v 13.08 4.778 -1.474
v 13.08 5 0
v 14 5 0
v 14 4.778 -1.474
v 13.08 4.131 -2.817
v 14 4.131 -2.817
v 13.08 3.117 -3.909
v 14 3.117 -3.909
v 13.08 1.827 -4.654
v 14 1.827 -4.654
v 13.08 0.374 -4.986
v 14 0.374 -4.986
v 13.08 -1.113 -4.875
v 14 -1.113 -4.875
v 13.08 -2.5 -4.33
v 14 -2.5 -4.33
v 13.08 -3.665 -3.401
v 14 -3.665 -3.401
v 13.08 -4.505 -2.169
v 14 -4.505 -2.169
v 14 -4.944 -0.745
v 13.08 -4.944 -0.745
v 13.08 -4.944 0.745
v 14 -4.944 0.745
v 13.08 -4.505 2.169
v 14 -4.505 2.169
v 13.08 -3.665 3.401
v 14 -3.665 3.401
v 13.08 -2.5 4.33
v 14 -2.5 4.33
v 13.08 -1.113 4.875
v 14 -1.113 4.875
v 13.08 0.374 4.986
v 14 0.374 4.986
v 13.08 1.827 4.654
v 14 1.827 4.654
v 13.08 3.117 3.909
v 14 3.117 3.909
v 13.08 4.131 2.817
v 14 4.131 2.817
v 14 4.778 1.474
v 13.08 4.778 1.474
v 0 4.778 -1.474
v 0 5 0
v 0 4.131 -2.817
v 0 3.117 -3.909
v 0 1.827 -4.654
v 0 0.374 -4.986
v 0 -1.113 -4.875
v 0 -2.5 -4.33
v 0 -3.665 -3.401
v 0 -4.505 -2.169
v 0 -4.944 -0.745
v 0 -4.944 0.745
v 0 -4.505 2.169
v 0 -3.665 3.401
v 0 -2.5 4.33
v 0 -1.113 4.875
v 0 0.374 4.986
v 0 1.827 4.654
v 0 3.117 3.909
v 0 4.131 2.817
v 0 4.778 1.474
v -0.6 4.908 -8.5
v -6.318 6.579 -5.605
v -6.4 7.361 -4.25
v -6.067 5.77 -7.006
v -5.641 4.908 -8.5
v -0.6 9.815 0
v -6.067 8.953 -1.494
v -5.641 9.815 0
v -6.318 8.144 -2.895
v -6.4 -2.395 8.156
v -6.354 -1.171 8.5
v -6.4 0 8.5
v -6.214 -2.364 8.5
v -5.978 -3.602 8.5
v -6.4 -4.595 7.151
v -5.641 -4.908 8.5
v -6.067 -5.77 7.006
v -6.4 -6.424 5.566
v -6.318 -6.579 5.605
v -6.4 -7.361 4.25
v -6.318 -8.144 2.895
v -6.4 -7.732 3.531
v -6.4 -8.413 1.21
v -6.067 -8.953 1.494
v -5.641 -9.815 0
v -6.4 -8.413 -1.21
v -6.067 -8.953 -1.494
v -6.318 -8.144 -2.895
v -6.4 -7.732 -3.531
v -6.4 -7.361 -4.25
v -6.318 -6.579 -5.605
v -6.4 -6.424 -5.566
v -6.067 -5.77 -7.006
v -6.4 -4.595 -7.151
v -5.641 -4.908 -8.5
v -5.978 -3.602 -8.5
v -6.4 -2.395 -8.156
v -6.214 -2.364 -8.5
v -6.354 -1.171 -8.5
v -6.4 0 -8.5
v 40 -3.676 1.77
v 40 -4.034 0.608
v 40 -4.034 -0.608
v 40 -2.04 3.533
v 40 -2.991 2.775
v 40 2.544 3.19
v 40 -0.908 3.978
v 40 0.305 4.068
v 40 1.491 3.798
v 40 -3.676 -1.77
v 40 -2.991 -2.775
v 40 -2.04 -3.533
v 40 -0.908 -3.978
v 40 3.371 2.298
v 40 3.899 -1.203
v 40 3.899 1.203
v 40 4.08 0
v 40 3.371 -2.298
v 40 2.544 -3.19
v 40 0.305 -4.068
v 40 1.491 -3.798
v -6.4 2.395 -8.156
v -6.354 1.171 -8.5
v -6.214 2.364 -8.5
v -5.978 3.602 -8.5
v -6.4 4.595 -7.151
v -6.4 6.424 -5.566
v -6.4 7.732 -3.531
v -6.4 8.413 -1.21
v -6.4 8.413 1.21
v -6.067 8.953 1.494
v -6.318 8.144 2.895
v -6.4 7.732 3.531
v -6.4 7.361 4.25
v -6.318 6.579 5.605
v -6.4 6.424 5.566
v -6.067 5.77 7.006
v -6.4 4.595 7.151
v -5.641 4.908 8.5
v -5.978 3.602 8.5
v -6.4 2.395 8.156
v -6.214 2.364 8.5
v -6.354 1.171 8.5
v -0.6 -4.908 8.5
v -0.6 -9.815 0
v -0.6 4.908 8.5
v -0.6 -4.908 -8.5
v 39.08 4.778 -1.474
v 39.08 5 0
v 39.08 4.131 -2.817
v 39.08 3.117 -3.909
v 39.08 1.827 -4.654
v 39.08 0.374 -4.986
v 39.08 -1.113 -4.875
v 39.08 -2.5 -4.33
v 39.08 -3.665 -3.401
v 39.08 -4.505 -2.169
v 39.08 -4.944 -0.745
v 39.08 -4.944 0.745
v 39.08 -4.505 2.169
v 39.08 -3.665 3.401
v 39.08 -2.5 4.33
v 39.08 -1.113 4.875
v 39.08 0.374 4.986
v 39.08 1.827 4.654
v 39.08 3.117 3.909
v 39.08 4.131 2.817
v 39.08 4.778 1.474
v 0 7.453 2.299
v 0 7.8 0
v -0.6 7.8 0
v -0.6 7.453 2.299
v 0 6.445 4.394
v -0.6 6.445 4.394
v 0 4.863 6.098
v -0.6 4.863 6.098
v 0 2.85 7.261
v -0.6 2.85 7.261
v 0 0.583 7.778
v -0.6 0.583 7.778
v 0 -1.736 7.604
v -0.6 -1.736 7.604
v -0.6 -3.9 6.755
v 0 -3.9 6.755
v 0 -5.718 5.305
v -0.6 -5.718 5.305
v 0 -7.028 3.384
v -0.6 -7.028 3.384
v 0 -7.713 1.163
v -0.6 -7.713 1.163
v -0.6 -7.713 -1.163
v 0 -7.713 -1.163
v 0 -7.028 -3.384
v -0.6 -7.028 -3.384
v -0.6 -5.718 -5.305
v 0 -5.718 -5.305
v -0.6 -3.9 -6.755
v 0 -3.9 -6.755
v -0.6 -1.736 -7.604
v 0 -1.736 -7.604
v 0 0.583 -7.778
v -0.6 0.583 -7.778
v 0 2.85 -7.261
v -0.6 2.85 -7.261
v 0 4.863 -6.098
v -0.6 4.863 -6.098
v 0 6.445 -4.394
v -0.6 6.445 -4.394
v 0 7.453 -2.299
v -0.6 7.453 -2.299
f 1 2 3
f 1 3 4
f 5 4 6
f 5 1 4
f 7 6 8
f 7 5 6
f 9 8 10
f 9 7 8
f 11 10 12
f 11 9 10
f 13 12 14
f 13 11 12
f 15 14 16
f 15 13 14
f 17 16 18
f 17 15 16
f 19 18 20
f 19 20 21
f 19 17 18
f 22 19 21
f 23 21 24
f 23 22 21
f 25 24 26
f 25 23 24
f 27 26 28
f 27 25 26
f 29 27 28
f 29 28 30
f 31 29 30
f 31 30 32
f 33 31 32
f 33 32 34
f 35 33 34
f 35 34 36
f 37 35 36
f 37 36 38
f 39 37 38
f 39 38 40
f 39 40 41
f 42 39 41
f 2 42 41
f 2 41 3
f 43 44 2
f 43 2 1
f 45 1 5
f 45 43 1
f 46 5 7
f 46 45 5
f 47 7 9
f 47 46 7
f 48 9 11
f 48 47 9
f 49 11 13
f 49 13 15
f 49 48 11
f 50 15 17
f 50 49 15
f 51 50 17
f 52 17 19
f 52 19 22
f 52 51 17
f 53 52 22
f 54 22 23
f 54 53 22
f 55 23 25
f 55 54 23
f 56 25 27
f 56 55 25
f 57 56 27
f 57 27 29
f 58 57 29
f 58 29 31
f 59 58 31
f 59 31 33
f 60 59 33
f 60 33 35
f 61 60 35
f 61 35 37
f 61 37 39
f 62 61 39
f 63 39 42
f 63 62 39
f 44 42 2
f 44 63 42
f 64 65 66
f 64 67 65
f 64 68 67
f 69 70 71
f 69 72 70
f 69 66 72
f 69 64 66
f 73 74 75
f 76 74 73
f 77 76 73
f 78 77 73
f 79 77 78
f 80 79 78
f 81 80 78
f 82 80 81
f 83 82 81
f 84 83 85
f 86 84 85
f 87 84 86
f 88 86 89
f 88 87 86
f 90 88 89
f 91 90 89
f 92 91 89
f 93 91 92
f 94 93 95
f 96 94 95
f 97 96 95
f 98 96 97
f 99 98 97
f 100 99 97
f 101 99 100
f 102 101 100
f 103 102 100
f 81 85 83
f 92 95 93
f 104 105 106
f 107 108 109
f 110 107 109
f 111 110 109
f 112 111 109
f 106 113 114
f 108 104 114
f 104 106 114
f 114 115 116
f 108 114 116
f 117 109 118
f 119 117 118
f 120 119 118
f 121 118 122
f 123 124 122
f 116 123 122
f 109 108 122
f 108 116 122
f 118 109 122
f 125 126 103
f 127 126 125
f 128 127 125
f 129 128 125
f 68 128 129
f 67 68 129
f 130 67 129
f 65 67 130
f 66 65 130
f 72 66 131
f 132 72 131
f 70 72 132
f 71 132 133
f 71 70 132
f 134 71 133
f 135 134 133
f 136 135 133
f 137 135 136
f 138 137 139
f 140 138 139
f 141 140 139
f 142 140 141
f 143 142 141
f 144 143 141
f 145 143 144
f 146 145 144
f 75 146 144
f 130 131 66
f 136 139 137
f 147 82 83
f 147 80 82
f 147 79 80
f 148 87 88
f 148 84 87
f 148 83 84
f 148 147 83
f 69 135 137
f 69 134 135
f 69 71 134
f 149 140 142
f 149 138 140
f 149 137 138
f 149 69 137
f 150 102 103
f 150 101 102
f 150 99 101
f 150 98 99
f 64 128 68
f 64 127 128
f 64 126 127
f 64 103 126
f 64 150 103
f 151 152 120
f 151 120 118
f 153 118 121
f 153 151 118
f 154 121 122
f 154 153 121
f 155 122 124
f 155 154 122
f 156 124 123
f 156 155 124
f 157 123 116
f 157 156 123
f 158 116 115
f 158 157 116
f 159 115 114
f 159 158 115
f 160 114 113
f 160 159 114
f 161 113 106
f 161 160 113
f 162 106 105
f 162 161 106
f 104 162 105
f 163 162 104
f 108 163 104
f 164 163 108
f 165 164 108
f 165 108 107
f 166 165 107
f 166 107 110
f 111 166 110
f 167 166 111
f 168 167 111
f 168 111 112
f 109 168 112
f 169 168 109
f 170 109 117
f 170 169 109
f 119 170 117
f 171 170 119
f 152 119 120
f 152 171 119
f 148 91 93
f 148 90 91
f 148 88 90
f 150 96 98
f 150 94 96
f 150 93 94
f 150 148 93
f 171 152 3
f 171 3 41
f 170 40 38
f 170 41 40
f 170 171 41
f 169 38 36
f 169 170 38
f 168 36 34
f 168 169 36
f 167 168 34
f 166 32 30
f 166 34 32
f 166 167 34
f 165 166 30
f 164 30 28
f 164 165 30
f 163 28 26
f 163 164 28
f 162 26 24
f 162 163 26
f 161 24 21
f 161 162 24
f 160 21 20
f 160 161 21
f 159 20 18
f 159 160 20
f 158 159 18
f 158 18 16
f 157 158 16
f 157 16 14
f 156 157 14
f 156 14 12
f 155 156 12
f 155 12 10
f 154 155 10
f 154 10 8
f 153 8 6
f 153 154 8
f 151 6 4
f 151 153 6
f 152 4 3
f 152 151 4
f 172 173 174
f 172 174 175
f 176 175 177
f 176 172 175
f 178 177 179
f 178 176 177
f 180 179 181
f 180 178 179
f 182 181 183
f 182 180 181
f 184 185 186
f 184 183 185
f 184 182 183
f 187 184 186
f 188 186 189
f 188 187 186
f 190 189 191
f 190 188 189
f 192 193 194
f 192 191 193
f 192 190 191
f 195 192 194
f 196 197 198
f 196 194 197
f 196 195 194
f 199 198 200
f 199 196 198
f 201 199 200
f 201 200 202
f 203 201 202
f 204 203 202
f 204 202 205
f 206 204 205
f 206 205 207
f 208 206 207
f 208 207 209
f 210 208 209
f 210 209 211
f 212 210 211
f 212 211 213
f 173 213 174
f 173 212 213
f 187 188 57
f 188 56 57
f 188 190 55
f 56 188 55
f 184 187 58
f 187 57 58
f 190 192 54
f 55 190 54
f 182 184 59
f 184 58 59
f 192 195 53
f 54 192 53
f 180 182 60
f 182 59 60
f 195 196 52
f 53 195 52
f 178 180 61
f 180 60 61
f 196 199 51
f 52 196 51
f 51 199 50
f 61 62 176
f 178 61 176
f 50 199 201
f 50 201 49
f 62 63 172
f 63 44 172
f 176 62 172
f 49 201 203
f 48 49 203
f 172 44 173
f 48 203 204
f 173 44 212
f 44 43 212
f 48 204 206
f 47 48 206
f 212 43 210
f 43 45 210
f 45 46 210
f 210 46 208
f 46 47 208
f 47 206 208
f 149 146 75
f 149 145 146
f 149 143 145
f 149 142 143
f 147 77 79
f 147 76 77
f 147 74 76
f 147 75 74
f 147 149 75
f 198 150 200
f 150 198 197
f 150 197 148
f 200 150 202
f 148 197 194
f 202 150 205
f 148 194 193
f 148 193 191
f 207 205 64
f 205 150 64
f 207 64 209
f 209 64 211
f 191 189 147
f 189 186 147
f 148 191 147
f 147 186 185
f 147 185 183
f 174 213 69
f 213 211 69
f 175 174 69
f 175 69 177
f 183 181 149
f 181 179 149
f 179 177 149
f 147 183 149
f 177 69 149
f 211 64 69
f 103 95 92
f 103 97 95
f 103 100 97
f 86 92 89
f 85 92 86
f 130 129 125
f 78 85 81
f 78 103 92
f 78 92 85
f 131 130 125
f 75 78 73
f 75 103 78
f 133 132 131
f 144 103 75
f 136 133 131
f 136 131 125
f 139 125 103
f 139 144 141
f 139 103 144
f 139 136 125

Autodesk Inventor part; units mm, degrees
ref_plane "YZ Plane" through (0, 0, 0) normal (1, 0, 0) x (0, 1, 0)
ref_plane "XZ Plane" through (0, 0, 0) normal (0, 1, 0) x (-1, 0, 0)
sketch "Sketch1" plane through (0, 0, 0) normal (0, 0, 1) x (1, 0, 0)
  line L0 (0, 7.8) -> (0, 5)
  line L1 (14, 5) -> (40, 5)
  line L2 (40, 5) -> (40, 0)
  line L3 (40, 0) -> (-0.6001, 0)
  line L4 (-8.7201, 0) -> (48.12, 0) projected
  line L5 (-0.6001, 0) -> (-0.6001, 7.8)
  line L6 (-0.6001, 7.8) -> (0, 7.8)
  line L7 (14, 5) -> (13.0797, 5)
  line L8 (13.0797, 5) -> (0, 5)
  line L9 (0, -1.56) -> (0, 9.36) projected
  dimension "d0" = 40
  dimension "d1" = 26
  dimension "d2" = 10
  dimension "d9" = 0.6001
  dimension "d10" = 15.6
  dimension "d13" = 0.9203
  dimension "d14" = 10
revolve "Body" add sketch "Sketch1" angle 360 about axis through (40, 0, 0) along (-1, 0, 0)
sketch "Sketch2" plane through (-0.6001, 0, 0) normal (-1, 0, 0) x (0, 0, 1)
  line L0 (0, 9.815) -> (8.5, 4.9075)
  line L1 (8.5, 4.9075) -> (8.5, -4.9075)
  line L2 (8.5, -4.9075) -> (0, -9.815)
  line L3 (0, -9.815) -> (-8.5, -4.9075)
  line L4 (-8.5, -4.9075) -> (-8.5, 4.9075)
  line L5 (-8.5, 4.9075) -> (0, 9.815)
  point P0 (0, 0)
  point P1 (0, 0)
  dimension "d11" = 17
extrude "Head" add sketch "Sketch2" along normal blind 5.8
sketch "Sketch4" plane through (0, 0, 0) normal (0, 0, 1) x (1, 0, 0)
  line L0 (-6.4001, 8.5) -> (-6.4001, 9.815)
  line L1 (-6.4001, 9.815) -> (-5.6409, 9.815)
  line L2 (-5.6409, 9.815) -> (-6.4001, 8.5)
  line L3 (-7.5601, 0) -> (0.5599, 0) projected
  line L4 (-0.6001, 9.815) -> (-6.4001, 9.815) projected
  line L5 (-6.4001, 4.9075) -> (-6.4001, 9.815) projected
  dimension "d5" = 30
  dimension "d19" = 17
revolve "Chamfer1" cut sketch "Sketch4" angle 360 about axis through (-10, 0, 0) along (1, 0, 0)
thread "Thread" size "M10x1.5" class "6g" standard "ISO Metric profile" length 26
chamfer "Chamfer2" distance 0.9202 distance2 0.9203 1 edges at (40, -5, 0) measured on face at (40, 1.2281, 0.495)
ref_plane "Work Plane1" through (1.525, 0, 0) normal (0, 0, 1) x (1, 0, 0)
equation "\"d0\" = NLG"
equation "\"d1\" = GEL"
equation "\"d2\" = GD"
equation "\"d10\" = SD2"
equation "\"d14\" = BDM"
equation "\"d11\" = SW"
equation "\"d3\" = KOH - SD"
equation "\"d5\" = ANG1"
equation "\"d19\" = SW0"
equation "\"d15\" = GEL"
equation "\"d6\" = -0.5 * SPD + 0.5 * GD"
equation "\"NLG\" = 40"
equation "\"GD\" = NND"
equation "\"BDM\" = NND"
equation "\"KOH\" = 6.4"
equation "\"GEL\" = 26"
equation "\"SW\" = 17"
equation "\"SW0\" = SW"
equation "\"SPD\" = NND - 1.2269 * PTC"
equation "\"SD2\" = 15.6"
equation "\"SD\" = 0.6"
equation "\"ANG1\" = 30deg"
equation "\"GAL\" = 0.61345 * PTC"
equation "\"GUL\" = 0.61345 * PTC"
equation "\"RR\" = 0.4"
equation "\"GD1\" = THREADDIA - 1.2269 * PTC"
equation "\"TOA\" = 30deg"
equation "\"PTC\" = 1.5"
equation "\"E0\" = 1.155 * SW"
equation "\"NND\" = 10"
equation "\"THREADDIA\" = 10"
properties part number "DIN 931-1 - M10 x 40" material "Steel, Mild"
